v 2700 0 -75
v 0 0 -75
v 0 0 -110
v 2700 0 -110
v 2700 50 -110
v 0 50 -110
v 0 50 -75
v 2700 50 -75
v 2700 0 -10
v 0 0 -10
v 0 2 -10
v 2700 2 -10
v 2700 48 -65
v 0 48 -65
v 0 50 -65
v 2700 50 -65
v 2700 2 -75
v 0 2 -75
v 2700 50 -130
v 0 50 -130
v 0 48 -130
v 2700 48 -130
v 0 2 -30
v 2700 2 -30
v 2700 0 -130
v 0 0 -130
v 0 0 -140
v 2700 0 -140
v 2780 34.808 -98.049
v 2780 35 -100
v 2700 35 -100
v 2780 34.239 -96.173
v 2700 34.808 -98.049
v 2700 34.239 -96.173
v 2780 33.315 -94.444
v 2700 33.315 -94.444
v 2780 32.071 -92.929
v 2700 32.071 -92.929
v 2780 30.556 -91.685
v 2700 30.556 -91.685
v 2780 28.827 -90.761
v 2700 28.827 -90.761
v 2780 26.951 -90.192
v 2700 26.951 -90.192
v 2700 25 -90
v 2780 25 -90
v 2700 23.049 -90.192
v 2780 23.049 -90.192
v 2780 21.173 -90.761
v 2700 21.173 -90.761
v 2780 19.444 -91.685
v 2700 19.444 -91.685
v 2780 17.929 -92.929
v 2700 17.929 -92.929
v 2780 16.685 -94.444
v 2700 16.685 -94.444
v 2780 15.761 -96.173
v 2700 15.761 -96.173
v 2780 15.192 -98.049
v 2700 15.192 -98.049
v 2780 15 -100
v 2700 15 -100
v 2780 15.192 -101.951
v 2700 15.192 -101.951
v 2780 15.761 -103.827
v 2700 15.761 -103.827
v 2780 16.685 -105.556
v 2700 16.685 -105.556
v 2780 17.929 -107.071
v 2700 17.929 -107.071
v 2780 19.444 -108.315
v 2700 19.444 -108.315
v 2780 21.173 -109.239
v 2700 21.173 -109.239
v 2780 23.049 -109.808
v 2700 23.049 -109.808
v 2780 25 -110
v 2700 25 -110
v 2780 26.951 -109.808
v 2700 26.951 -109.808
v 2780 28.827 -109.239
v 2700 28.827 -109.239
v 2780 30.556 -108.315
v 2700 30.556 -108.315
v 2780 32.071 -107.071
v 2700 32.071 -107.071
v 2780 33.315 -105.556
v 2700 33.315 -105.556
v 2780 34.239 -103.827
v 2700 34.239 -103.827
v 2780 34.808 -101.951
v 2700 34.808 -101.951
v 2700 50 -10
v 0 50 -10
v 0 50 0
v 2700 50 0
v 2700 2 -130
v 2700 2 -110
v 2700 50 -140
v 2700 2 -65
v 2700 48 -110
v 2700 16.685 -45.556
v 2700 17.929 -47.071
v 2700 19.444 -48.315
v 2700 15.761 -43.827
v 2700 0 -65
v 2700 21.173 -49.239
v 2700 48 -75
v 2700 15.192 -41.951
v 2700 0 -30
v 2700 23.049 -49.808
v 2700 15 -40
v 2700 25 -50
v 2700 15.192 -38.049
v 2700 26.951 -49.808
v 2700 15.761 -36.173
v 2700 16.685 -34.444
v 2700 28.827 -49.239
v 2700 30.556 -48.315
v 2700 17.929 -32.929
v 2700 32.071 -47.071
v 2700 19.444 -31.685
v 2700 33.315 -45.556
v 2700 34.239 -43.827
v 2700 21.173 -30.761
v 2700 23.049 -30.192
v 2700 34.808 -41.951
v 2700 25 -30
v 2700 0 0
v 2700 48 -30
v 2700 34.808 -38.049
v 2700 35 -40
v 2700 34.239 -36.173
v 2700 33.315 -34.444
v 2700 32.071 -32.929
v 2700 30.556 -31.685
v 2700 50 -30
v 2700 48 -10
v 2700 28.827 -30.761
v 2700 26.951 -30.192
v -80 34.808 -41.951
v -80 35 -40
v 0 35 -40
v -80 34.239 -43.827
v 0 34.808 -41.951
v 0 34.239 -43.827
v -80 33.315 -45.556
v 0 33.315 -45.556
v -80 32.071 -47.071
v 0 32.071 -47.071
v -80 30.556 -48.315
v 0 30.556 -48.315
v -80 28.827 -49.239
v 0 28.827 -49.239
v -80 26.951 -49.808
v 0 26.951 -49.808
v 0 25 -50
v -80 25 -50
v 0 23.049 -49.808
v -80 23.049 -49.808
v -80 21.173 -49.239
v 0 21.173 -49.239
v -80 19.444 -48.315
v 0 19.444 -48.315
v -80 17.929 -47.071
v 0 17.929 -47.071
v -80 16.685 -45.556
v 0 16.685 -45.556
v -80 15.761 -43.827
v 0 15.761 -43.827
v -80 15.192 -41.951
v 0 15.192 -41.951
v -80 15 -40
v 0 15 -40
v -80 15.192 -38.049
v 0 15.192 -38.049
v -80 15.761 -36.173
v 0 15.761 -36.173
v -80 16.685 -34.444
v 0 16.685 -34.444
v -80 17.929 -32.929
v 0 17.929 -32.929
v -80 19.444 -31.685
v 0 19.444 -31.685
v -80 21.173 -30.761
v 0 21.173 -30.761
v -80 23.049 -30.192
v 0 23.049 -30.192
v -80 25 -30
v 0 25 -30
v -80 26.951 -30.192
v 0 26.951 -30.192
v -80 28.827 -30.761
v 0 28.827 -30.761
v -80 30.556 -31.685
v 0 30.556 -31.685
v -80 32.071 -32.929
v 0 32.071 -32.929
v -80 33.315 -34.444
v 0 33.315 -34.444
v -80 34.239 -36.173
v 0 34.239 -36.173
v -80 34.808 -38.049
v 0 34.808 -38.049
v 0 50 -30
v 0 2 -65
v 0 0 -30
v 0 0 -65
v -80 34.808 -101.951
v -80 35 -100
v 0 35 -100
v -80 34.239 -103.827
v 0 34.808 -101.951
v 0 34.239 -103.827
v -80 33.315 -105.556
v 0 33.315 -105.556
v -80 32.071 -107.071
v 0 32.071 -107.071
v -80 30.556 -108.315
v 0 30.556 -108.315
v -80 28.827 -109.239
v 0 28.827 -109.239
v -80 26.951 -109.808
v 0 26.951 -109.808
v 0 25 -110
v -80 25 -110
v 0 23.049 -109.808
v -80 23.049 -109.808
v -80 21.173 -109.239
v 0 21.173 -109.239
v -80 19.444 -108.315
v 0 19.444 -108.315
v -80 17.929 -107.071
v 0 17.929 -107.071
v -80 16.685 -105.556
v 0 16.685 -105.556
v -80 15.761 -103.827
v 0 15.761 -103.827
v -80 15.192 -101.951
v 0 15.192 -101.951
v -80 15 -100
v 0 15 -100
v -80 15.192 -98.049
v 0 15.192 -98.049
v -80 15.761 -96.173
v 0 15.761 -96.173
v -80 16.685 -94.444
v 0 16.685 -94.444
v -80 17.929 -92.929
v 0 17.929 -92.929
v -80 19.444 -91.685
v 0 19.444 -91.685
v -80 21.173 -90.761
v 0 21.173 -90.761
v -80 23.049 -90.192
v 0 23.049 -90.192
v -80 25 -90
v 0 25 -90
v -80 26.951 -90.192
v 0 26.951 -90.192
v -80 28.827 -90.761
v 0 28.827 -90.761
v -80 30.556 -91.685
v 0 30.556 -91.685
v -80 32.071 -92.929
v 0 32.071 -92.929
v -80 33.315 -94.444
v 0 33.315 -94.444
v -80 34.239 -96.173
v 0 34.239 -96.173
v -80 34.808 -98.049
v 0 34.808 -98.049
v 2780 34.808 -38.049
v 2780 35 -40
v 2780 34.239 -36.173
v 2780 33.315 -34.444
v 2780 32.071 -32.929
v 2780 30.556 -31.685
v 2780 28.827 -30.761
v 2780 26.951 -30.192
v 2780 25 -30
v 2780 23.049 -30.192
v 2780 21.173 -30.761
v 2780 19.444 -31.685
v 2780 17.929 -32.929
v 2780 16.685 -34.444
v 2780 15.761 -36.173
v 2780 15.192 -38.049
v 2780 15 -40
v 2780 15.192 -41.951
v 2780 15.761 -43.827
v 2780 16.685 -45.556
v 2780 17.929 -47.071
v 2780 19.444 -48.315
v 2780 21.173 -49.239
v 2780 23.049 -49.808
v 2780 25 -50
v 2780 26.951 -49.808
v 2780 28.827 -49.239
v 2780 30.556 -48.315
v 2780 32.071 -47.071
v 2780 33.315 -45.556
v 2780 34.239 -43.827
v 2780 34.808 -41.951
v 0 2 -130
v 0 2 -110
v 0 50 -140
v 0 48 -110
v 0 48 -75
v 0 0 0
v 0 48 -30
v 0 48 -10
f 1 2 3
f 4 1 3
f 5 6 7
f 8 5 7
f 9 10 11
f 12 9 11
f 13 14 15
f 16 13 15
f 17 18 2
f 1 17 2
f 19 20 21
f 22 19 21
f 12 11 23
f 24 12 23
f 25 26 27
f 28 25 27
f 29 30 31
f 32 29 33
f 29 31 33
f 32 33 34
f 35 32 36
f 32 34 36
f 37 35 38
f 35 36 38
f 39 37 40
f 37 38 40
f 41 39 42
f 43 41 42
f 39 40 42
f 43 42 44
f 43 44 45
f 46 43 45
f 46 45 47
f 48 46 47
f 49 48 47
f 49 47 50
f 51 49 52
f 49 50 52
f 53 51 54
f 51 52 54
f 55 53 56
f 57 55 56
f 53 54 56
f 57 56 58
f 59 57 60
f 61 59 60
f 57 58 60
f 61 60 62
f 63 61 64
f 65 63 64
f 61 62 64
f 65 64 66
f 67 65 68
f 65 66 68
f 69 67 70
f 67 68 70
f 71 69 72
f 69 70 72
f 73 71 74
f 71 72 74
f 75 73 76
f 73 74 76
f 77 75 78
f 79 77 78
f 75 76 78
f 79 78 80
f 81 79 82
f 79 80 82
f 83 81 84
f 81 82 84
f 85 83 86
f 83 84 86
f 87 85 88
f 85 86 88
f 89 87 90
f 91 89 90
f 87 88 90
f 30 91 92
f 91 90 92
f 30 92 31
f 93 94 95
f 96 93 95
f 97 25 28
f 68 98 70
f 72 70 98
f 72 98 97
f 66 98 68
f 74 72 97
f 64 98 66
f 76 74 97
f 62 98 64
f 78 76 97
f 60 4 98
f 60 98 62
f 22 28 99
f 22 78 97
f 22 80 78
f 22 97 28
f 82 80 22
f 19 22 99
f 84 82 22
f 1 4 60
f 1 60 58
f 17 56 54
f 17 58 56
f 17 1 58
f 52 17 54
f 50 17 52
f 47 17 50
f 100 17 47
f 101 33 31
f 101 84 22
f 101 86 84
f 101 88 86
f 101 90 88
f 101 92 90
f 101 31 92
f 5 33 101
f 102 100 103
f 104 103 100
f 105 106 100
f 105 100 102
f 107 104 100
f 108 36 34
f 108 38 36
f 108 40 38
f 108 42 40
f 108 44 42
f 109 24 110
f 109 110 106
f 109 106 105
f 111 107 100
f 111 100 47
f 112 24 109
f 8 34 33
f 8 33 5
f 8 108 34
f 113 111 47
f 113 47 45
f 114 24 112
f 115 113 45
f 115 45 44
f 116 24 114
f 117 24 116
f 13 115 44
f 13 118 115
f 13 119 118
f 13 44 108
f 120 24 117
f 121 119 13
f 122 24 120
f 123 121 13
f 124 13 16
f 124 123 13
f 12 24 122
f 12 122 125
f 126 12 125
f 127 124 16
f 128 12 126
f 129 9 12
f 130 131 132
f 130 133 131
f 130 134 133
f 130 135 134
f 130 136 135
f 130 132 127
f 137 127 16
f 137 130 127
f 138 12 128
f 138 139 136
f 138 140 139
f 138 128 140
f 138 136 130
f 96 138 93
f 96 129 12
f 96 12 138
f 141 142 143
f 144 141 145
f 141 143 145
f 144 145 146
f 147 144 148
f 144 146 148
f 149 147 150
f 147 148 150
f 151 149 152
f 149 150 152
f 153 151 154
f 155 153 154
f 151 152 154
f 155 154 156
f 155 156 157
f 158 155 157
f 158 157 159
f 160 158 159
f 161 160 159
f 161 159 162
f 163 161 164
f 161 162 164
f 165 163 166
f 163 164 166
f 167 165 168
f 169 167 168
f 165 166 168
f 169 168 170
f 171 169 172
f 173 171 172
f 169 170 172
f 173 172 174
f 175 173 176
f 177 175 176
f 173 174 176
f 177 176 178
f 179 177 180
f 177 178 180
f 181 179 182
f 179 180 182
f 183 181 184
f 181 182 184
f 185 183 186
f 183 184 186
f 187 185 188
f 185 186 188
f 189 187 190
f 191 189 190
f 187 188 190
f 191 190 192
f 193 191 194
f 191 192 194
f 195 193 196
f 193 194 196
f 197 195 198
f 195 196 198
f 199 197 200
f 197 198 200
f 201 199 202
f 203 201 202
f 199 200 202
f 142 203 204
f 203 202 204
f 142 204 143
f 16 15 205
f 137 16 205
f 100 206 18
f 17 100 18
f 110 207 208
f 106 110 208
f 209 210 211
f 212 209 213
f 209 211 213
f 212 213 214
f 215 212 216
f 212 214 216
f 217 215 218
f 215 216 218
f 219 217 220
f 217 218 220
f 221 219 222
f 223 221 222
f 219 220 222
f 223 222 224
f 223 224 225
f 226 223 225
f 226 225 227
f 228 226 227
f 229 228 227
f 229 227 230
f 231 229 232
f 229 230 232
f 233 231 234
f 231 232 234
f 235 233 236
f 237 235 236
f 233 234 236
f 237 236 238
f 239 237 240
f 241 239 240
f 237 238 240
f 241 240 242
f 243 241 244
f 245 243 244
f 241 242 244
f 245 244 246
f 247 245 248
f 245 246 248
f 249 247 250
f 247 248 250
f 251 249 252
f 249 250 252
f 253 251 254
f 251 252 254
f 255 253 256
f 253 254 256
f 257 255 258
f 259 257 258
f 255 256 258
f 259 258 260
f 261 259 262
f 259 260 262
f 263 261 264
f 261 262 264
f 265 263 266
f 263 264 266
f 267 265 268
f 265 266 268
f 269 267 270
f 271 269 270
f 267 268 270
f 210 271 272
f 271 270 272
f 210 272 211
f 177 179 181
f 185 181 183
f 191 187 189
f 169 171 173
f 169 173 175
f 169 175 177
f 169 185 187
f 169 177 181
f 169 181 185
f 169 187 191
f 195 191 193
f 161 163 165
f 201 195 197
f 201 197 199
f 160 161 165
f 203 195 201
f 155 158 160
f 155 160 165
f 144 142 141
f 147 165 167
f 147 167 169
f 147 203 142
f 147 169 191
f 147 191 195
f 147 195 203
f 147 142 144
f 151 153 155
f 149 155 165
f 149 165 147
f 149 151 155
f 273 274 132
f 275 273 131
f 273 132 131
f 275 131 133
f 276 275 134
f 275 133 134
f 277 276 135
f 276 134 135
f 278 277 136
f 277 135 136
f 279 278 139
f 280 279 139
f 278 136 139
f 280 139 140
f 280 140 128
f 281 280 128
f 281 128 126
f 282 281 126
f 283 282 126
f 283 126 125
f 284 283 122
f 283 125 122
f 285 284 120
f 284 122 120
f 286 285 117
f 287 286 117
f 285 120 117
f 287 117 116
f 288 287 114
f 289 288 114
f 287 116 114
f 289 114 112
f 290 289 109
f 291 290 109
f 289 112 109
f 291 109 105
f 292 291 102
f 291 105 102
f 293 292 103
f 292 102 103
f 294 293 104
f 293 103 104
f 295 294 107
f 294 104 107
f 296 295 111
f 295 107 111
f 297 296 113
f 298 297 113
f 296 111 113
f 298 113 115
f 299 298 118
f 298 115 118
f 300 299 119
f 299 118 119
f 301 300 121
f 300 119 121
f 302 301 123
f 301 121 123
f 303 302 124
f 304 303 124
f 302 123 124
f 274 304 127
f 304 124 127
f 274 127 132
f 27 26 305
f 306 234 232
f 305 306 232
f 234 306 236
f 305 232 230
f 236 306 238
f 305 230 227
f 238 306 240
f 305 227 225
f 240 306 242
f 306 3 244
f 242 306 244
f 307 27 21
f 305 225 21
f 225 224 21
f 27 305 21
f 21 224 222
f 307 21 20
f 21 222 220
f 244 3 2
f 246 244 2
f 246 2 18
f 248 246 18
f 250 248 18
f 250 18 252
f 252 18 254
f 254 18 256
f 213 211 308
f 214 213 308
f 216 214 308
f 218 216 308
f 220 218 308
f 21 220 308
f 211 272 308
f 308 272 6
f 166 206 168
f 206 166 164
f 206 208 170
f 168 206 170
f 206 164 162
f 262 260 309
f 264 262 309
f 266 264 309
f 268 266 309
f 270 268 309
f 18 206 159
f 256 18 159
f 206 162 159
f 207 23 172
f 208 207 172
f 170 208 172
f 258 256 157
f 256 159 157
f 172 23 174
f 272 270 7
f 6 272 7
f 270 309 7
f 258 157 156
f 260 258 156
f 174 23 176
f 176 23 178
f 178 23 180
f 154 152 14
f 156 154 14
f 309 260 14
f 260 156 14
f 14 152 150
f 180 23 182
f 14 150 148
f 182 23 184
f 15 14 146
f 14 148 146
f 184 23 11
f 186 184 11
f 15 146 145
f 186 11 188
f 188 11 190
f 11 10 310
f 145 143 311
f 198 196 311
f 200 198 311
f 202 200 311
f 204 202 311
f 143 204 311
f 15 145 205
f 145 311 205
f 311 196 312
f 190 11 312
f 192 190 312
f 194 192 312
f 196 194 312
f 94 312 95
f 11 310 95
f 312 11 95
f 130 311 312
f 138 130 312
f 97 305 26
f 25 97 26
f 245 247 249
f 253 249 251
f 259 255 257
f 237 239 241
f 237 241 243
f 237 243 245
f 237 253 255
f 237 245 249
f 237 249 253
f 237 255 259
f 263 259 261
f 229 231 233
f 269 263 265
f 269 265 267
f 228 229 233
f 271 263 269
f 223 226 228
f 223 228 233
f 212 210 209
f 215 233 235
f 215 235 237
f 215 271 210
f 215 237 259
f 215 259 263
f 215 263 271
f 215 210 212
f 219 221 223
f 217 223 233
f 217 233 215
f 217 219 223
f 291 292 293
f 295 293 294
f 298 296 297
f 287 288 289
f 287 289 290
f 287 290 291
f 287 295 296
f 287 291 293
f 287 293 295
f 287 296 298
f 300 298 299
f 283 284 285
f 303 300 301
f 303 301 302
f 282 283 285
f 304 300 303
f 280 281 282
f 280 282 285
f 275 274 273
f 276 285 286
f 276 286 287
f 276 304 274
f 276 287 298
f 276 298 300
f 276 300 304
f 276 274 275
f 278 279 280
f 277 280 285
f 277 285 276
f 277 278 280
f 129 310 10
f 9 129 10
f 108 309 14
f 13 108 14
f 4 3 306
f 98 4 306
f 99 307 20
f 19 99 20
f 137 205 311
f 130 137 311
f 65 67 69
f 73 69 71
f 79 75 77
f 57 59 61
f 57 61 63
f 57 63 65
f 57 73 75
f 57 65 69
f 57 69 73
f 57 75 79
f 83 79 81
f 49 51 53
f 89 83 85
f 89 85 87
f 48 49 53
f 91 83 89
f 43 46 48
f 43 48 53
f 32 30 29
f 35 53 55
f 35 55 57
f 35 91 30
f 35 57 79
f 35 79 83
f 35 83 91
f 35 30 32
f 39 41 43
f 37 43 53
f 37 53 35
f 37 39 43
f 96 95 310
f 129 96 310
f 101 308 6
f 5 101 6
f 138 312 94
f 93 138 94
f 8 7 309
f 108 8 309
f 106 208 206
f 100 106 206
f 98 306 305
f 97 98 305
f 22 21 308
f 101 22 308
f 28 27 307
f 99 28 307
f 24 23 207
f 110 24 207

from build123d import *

# Parameters (mm, degrees)
PAD_DEPTH    = 2700
SKETCH_R     = 10
PAD001_DEPTH = 80
SKETCH002_R  = 10
PAD002_DEPTH = 80


with BuildPart() as part:
    # Sketch001 → Pad (new body)
    with BuildSketch(Plane.YZ):
        Polygon((0, 0), (0, -10), (2, -10), (2, -30), (0, -30), (0, -65), (2, -65), (2, -75), (0, -75), (0, -110), (2, -110), (2, -130), (0, -130), (0, -140), (50, -140), (50, -130), (48, -130), (48, -110), (50, -110), (50, -75), (48, -75), (48, -65), (50, -65), (50, -30), (48, -30), (48, -10), (50, -10), (50, 0), align=None)
    extrude(amount=PAD_DEPTH)

    # Sketch (on Face29 of Pad) → Pad001 (join)
    with BuildSketch(Plane(origin=(0, 0, 0), x_dir=(0, 1, 0), z_dir=(-1, 0, 0))):
        with Locations((25, 100)):
            Circle(SKETCH_R)
        with Locations((25, 40)):
            Circle(SKETCH_R)
    extrude(amount=PAD001_DEPTH)

    # Sketch002 (on Face5 of Pad001) → Pad002 (join)
    with BuildSketch(Plane.YZ.offset(2700)):
        with Locations((25, -40)):
            Circle(SKETCH002_R)
        with Locations((25, -100)):
            Circle(SKETCH002_R)
    extrude(amount=PAD002_DEPTH)


solid = part.part
